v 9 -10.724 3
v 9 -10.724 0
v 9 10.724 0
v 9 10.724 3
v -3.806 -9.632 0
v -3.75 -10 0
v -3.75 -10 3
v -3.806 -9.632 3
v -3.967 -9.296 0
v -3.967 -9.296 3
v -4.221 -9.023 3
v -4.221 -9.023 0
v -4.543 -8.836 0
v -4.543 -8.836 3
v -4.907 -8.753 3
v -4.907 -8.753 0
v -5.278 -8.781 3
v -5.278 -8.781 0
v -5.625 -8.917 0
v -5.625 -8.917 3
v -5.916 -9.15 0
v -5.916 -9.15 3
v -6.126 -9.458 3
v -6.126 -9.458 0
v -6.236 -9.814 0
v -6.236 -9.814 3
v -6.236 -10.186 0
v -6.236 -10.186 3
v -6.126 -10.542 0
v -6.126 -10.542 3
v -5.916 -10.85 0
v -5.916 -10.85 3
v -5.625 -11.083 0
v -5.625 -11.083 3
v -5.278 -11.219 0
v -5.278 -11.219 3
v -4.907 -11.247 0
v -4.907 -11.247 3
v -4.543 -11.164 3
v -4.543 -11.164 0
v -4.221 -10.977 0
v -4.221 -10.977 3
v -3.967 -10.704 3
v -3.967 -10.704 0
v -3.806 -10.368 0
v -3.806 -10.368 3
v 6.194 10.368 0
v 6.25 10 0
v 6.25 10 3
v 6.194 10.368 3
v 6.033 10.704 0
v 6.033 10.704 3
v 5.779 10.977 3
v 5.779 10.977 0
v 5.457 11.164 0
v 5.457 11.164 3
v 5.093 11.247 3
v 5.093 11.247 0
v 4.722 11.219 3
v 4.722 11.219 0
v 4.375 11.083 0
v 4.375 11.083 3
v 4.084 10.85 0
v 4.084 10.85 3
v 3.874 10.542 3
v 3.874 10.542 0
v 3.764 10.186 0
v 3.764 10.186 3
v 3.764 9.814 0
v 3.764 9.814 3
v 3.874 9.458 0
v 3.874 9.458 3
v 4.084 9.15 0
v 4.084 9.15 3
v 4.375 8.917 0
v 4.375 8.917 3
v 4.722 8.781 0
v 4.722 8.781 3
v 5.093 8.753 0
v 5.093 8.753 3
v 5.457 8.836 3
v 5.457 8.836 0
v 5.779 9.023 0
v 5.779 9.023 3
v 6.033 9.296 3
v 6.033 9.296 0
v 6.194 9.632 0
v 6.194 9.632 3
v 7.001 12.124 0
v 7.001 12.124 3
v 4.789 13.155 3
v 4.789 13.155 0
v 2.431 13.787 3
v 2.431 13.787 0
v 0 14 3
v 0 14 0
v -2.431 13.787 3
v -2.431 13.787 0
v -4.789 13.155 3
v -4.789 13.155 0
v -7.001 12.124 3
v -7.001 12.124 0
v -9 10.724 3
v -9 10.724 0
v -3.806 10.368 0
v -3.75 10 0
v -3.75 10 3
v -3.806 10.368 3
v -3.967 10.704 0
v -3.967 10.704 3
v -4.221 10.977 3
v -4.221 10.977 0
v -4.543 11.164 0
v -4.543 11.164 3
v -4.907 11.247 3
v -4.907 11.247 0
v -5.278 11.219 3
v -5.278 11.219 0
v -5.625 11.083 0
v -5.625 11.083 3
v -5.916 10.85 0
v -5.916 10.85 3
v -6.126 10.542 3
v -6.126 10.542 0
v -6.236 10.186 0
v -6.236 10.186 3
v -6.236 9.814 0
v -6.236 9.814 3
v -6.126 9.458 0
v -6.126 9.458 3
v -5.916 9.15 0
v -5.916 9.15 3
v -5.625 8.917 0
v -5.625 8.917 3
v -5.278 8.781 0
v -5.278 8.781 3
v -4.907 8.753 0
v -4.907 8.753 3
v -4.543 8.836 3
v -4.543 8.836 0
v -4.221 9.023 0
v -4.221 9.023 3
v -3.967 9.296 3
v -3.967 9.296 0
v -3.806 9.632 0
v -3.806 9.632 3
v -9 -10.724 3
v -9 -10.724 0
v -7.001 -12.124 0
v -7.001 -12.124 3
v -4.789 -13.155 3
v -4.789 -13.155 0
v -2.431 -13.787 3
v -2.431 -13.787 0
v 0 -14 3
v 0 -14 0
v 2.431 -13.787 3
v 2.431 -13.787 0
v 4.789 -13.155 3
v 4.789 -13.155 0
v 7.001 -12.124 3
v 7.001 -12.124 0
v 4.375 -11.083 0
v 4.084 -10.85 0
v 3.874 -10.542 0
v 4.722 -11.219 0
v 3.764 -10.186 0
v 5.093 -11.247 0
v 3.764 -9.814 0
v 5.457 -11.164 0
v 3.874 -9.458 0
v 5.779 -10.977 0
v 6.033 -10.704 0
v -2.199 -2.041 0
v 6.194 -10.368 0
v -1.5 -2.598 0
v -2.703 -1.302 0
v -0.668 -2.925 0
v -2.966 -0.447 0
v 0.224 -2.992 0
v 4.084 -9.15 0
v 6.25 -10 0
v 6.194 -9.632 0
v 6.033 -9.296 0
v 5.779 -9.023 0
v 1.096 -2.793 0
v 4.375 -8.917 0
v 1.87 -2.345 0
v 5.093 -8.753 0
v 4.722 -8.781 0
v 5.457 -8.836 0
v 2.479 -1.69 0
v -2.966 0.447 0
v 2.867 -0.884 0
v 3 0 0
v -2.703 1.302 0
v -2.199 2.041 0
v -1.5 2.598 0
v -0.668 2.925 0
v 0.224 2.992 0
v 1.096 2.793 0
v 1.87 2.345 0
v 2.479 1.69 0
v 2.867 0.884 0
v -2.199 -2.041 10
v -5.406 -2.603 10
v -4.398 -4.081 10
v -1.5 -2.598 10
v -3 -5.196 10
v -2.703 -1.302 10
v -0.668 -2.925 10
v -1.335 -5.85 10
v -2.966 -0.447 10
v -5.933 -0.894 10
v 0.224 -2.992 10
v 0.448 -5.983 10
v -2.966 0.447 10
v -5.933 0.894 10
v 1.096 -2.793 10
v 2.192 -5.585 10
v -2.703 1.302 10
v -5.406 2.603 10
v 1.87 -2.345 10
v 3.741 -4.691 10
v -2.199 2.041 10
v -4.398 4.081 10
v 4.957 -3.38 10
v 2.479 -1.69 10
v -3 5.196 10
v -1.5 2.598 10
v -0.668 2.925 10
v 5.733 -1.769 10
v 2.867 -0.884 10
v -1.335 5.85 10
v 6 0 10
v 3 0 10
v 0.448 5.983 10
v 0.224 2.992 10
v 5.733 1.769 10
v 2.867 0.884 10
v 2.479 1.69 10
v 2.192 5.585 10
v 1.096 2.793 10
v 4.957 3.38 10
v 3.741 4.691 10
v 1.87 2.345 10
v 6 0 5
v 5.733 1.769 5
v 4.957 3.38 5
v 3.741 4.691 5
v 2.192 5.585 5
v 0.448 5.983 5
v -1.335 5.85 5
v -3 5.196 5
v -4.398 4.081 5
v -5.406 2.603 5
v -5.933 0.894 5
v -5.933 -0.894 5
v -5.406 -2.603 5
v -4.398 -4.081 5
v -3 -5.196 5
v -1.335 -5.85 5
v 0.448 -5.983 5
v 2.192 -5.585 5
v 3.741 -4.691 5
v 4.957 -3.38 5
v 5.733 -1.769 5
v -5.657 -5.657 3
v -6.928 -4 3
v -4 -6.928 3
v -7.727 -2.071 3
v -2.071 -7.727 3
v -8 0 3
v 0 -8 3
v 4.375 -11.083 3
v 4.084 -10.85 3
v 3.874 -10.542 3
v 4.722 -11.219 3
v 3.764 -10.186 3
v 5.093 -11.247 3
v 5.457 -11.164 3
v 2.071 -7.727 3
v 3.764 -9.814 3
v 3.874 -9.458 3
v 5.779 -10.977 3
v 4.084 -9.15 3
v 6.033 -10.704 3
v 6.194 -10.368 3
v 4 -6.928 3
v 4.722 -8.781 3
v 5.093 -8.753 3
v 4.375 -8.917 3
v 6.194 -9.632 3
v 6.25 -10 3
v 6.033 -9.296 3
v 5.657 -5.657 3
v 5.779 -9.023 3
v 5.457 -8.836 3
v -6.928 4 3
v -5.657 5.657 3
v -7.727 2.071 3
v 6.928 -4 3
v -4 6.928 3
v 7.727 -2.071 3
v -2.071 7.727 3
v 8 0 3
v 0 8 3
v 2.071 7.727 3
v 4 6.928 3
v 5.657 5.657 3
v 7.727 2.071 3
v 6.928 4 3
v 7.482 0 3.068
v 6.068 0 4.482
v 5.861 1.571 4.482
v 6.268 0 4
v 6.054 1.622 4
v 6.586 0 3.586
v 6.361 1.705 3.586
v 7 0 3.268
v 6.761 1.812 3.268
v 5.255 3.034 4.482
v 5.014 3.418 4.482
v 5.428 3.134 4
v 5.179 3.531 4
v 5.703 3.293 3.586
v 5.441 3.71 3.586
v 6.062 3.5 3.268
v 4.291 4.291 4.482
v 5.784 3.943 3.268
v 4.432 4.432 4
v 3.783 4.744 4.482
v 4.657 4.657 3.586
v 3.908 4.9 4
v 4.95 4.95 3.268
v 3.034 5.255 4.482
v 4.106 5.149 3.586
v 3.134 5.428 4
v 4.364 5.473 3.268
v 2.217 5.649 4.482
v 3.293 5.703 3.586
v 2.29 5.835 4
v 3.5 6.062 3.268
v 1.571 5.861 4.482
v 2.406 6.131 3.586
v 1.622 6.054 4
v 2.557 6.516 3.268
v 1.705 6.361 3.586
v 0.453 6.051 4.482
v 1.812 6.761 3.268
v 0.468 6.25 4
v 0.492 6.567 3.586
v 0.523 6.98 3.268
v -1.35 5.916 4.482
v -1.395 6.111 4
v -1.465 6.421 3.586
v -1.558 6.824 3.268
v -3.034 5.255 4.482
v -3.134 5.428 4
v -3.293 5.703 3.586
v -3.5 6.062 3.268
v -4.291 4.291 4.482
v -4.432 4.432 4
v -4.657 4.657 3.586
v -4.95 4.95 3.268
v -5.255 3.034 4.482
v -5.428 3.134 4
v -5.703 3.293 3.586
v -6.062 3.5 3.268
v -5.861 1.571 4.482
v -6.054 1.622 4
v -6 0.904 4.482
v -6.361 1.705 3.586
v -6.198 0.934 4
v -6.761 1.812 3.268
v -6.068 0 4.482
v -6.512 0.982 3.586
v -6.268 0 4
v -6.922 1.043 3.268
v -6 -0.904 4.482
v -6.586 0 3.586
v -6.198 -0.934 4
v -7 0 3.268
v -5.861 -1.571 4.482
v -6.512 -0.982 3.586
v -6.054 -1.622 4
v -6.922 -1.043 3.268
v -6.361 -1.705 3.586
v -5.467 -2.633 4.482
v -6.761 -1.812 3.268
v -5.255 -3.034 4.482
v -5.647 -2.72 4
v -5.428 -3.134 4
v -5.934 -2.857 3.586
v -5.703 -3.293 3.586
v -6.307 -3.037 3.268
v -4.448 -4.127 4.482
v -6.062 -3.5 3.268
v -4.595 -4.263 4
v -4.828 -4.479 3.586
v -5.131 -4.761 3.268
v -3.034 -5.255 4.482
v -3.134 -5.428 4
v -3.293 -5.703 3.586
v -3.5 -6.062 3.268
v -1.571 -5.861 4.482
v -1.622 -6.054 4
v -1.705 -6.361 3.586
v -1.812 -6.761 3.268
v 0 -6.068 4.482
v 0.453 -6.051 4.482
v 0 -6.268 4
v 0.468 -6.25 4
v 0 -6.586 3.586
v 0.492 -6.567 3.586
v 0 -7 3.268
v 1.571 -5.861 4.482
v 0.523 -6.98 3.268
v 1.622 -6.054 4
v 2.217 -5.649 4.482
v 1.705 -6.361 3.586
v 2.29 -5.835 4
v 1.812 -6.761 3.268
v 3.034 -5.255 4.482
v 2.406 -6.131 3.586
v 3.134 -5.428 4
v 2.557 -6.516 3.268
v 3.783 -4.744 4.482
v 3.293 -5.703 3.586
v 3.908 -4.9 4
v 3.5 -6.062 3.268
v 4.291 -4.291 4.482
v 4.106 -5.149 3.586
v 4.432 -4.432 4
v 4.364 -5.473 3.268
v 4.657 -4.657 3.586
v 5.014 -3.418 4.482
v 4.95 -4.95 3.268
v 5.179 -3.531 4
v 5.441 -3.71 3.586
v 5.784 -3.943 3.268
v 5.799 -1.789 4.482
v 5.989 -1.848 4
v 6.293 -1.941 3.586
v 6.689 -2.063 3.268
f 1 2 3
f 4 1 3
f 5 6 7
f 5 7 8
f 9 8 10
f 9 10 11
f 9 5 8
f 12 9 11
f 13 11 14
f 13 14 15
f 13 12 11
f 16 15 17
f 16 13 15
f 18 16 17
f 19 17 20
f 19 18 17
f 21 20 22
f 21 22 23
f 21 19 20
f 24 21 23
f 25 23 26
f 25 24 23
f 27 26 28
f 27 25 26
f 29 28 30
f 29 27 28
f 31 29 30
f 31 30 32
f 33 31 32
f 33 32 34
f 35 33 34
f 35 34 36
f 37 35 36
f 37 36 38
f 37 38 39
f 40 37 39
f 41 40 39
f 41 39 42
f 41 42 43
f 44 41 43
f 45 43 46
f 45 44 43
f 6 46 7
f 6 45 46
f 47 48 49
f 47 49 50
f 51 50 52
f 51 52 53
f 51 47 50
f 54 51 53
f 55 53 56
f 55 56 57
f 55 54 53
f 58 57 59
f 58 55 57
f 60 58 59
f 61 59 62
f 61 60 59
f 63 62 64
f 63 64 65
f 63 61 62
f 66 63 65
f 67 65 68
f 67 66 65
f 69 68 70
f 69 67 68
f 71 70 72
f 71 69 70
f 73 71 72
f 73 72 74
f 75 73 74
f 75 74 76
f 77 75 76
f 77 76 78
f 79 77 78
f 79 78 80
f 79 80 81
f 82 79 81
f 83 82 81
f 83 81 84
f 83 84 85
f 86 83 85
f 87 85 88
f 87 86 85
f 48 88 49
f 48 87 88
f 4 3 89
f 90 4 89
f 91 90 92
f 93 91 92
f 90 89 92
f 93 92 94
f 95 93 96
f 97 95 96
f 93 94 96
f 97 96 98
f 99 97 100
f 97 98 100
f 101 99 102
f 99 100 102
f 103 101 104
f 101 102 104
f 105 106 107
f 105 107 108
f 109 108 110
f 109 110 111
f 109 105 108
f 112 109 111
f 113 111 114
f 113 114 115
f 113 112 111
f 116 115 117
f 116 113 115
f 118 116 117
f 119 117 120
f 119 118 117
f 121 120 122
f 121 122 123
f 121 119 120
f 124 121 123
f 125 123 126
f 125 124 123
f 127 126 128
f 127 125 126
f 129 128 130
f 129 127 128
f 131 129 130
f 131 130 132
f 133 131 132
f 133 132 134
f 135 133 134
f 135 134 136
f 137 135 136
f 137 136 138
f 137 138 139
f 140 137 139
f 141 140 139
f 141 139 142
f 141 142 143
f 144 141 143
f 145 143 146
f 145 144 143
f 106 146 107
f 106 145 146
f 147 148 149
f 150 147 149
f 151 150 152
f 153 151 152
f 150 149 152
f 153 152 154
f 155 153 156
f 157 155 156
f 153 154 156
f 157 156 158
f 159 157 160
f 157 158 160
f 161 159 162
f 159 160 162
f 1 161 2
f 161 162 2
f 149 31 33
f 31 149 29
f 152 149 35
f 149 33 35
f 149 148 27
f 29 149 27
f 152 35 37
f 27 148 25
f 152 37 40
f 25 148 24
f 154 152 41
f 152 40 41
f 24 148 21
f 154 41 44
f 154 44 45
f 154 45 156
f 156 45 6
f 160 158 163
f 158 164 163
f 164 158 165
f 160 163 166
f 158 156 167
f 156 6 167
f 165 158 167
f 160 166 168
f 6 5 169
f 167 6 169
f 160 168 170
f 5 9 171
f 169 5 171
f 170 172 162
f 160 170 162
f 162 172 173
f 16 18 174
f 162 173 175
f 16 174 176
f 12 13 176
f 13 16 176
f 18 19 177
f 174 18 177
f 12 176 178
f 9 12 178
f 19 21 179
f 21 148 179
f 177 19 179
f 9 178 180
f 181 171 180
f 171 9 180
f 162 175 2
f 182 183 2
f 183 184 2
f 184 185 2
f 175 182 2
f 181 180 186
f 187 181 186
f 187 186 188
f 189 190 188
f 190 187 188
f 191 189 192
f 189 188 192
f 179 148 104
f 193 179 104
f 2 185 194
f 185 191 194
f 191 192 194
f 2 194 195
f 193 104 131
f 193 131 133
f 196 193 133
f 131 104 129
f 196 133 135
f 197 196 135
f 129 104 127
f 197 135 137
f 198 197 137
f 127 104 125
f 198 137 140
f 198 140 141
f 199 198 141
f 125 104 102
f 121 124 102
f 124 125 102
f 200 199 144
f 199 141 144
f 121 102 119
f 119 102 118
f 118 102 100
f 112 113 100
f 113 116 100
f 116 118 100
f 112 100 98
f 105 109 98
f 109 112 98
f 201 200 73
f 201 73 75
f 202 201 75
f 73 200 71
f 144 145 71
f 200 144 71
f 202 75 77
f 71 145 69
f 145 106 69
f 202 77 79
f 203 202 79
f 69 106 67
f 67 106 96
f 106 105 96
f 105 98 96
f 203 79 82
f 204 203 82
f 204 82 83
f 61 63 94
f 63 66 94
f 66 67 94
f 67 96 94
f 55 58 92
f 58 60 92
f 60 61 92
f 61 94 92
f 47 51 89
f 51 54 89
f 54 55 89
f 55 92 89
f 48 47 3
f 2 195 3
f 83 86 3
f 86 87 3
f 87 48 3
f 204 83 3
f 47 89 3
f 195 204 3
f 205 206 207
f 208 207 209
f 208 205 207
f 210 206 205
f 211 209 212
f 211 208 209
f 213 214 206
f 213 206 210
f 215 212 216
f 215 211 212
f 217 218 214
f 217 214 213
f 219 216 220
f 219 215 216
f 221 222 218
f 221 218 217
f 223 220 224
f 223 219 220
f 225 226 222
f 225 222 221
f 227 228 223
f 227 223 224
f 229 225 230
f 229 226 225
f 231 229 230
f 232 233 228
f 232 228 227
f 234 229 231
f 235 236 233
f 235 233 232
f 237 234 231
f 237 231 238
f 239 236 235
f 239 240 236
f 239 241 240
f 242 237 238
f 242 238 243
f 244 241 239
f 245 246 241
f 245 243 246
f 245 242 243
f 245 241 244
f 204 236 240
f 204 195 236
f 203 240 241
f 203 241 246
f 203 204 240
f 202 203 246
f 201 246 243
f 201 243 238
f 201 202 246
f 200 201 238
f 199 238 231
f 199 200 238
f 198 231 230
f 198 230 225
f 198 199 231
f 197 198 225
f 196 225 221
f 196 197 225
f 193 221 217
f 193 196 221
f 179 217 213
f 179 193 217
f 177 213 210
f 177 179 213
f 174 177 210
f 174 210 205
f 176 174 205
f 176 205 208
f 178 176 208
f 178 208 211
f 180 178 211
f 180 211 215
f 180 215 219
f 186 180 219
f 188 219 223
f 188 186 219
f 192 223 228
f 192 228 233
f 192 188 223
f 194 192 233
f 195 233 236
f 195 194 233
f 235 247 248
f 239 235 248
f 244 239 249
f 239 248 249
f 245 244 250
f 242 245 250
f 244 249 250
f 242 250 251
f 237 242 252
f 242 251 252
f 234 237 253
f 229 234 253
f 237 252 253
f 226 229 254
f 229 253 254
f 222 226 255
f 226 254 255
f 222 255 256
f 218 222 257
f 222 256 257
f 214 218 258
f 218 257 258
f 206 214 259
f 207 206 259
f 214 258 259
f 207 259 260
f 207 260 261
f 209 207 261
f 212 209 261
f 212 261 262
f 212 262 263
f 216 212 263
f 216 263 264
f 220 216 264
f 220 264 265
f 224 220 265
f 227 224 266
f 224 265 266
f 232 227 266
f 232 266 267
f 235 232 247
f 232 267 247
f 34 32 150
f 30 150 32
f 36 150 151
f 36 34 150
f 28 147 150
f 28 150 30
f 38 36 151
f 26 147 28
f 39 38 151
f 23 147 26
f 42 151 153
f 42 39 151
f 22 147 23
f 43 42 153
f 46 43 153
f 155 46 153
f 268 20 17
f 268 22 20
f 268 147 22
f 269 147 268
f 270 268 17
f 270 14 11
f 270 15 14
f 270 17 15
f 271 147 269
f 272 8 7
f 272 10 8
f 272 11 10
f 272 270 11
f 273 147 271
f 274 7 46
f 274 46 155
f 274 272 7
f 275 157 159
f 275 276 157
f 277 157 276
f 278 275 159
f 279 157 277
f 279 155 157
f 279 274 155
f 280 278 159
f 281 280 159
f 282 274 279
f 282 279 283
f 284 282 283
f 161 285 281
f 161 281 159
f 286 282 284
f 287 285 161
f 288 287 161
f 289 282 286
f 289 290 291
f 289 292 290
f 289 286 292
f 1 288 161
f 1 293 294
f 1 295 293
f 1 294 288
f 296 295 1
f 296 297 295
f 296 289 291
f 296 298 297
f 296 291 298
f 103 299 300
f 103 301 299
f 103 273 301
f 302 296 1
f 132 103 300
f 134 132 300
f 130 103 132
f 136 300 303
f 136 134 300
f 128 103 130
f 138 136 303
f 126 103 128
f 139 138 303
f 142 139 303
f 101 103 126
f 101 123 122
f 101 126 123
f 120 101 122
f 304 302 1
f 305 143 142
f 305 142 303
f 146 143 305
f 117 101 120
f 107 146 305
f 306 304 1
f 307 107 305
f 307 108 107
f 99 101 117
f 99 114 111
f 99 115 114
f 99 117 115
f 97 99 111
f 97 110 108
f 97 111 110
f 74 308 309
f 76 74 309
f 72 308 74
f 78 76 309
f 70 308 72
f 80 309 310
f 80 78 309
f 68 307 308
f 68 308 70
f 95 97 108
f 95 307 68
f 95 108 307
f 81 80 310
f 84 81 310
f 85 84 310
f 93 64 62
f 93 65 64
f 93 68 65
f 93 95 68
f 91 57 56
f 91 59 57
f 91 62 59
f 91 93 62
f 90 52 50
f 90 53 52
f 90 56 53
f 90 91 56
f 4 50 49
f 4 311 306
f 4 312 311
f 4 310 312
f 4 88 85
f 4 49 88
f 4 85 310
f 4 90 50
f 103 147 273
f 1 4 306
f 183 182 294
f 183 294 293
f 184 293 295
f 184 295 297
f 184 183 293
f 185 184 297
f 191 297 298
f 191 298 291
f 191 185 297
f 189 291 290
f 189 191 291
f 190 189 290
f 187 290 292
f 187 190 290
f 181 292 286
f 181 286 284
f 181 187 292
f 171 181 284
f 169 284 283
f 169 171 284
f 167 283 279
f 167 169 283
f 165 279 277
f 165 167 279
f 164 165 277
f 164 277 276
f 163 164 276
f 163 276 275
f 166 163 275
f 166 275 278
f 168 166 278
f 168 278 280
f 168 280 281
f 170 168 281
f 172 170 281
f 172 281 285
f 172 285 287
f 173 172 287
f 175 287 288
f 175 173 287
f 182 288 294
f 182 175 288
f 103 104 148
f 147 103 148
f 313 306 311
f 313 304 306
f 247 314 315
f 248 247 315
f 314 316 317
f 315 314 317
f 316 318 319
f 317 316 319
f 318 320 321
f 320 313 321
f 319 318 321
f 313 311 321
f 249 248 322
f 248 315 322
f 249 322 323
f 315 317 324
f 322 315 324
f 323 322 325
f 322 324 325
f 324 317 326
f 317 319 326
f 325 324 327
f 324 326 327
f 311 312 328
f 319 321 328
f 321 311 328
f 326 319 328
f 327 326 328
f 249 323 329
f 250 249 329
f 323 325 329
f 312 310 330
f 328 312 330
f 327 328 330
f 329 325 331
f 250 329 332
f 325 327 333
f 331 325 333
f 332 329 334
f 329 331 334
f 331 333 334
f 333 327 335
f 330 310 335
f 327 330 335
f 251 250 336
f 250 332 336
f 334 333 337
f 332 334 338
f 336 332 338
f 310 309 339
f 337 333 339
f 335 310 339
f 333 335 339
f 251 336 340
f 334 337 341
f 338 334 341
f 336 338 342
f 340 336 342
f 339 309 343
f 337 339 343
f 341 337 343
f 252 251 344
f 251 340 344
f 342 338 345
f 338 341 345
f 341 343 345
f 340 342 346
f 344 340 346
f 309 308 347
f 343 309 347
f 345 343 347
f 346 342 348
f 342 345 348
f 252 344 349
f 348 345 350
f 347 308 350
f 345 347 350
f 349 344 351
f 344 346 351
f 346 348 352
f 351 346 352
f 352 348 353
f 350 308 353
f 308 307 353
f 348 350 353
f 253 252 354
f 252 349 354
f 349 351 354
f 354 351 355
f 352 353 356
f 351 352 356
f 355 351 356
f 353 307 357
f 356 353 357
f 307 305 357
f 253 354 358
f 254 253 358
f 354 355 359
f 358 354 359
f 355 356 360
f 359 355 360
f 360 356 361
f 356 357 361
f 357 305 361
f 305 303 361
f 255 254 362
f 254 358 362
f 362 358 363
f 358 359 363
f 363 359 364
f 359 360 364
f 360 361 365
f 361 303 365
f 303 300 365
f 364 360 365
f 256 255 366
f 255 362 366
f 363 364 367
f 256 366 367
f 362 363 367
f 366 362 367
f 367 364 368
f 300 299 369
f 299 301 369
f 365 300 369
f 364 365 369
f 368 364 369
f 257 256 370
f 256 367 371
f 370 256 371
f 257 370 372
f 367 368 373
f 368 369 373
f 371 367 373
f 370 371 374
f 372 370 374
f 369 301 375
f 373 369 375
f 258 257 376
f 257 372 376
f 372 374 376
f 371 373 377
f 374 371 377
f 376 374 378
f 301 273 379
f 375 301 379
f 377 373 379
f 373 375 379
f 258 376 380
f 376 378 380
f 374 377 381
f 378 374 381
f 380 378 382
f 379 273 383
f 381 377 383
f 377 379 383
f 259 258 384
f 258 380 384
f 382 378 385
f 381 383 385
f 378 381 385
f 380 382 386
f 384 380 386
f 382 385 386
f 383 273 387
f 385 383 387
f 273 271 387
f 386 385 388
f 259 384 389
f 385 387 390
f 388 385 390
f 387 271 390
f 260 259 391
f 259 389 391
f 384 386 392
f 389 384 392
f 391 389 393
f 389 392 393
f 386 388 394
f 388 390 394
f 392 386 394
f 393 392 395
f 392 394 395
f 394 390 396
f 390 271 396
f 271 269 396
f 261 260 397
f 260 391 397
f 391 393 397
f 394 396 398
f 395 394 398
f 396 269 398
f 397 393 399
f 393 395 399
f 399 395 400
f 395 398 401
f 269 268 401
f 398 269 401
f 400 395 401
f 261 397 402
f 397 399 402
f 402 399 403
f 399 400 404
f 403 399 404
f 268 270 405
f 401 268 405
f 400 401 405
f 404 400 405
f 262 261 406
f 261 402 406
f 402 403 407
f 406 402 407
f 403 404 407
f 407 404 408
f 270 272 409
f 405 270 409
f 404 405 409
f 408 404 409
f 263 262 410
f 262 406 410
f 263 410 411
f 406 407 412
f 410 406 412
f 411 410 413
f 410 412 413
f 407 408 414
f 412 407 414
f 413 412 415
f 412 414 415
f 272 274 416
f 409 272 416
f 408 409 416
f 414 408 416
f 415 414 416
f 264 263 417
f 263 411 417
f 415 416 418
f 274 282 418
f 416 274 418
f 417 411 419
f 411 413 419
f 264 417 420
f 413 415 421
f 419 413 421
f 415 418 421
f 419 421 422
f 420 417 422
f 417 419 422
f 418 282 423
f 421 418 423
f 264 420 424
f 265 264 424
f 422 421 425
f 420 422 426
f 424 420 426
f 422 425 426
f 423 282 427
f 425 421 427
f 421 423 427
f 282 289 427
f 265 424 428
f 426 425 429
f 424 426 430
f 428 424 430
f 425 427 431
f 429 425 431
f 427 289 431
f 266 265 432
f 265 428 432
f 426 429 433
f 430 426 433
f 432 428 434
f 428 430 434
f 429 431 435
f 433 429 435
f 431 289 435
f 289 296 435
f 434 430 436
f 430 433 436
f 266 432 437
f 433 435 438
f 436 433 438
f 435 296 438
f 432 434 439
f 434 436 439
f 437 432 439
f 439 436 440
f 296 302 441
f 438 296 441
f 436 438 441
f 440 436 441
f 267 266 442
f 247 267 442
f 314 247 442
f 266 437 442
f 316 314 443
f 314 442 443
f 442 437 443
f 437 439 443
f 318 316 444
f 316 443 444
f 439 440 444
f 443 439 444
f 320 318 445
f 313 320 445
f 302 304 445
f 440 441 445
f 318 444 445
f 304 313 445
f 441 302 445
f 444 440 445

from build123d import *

# Parameters (mm, degrees)
SKETCH1_R               = 3
SKETCH1_R_2             = 1.25
MAIN_DEPTH              = 3
SKETCH2_R               = 6
SKETCH2_R_2             = 3
LINEARBALLSUPPORT_DEPTH = 7
FILLET1_R               = 2


with BuildPart() as part:
    # Sketch1 → Main (new body)
    with BuildSketch(Plane.XY):
        with BuildLine():
            Line((-9, 10.723805295), (-9, -10.723805295))
            ThreePointArc((-9, -10.723805295), (0, -14), (9, -10.723805295))
            Line((9, -10.723805295), (9, 10.723805295))
            ThreePointArc((9, 10.723805295), (0, 14), (-9, 10.723805295))
        make_face()
        Circle(SKETCH1_R, mode=Mode.SUBTRACT)
        with Locations((-5, 10)):
            Circle(SKETCH1_R_2, mode=Mode.SUBTRACT)
        with Locations((5, 10)):
            Circle(SKETCH1_R_2, mode=Mode.SUBTRACT)
        with Locations((-5, -10)):
            Circle(SKETCH1_R_2, mode=Mode.SUBTRACT)
        with Locations((5, -10)):
            Circle(SKETCH1_R_2, mode=Mode.SUBTRACT)
    extrude(amount=MAIN_DEPTH)

    # Sketch2 → LinearBallSupport (add)
    with BuildSketch(Plane.XY.offset(3)):
        Circle(SKETCH2_R)
        Circle(SKETCH2_R_2, mode=Mode.SUBTRACT)
    extrude(amount=LINEARBALLSUPPORT_DEPTH)

    # Fillet1
    fillet1_edges = [part.edges().sort_by_distance(p)[0] for p in [
        (-6, 0, 3),
    ]]
    fillet(fillet1_edges, radius=FILLET1_R)


solid = part.part
